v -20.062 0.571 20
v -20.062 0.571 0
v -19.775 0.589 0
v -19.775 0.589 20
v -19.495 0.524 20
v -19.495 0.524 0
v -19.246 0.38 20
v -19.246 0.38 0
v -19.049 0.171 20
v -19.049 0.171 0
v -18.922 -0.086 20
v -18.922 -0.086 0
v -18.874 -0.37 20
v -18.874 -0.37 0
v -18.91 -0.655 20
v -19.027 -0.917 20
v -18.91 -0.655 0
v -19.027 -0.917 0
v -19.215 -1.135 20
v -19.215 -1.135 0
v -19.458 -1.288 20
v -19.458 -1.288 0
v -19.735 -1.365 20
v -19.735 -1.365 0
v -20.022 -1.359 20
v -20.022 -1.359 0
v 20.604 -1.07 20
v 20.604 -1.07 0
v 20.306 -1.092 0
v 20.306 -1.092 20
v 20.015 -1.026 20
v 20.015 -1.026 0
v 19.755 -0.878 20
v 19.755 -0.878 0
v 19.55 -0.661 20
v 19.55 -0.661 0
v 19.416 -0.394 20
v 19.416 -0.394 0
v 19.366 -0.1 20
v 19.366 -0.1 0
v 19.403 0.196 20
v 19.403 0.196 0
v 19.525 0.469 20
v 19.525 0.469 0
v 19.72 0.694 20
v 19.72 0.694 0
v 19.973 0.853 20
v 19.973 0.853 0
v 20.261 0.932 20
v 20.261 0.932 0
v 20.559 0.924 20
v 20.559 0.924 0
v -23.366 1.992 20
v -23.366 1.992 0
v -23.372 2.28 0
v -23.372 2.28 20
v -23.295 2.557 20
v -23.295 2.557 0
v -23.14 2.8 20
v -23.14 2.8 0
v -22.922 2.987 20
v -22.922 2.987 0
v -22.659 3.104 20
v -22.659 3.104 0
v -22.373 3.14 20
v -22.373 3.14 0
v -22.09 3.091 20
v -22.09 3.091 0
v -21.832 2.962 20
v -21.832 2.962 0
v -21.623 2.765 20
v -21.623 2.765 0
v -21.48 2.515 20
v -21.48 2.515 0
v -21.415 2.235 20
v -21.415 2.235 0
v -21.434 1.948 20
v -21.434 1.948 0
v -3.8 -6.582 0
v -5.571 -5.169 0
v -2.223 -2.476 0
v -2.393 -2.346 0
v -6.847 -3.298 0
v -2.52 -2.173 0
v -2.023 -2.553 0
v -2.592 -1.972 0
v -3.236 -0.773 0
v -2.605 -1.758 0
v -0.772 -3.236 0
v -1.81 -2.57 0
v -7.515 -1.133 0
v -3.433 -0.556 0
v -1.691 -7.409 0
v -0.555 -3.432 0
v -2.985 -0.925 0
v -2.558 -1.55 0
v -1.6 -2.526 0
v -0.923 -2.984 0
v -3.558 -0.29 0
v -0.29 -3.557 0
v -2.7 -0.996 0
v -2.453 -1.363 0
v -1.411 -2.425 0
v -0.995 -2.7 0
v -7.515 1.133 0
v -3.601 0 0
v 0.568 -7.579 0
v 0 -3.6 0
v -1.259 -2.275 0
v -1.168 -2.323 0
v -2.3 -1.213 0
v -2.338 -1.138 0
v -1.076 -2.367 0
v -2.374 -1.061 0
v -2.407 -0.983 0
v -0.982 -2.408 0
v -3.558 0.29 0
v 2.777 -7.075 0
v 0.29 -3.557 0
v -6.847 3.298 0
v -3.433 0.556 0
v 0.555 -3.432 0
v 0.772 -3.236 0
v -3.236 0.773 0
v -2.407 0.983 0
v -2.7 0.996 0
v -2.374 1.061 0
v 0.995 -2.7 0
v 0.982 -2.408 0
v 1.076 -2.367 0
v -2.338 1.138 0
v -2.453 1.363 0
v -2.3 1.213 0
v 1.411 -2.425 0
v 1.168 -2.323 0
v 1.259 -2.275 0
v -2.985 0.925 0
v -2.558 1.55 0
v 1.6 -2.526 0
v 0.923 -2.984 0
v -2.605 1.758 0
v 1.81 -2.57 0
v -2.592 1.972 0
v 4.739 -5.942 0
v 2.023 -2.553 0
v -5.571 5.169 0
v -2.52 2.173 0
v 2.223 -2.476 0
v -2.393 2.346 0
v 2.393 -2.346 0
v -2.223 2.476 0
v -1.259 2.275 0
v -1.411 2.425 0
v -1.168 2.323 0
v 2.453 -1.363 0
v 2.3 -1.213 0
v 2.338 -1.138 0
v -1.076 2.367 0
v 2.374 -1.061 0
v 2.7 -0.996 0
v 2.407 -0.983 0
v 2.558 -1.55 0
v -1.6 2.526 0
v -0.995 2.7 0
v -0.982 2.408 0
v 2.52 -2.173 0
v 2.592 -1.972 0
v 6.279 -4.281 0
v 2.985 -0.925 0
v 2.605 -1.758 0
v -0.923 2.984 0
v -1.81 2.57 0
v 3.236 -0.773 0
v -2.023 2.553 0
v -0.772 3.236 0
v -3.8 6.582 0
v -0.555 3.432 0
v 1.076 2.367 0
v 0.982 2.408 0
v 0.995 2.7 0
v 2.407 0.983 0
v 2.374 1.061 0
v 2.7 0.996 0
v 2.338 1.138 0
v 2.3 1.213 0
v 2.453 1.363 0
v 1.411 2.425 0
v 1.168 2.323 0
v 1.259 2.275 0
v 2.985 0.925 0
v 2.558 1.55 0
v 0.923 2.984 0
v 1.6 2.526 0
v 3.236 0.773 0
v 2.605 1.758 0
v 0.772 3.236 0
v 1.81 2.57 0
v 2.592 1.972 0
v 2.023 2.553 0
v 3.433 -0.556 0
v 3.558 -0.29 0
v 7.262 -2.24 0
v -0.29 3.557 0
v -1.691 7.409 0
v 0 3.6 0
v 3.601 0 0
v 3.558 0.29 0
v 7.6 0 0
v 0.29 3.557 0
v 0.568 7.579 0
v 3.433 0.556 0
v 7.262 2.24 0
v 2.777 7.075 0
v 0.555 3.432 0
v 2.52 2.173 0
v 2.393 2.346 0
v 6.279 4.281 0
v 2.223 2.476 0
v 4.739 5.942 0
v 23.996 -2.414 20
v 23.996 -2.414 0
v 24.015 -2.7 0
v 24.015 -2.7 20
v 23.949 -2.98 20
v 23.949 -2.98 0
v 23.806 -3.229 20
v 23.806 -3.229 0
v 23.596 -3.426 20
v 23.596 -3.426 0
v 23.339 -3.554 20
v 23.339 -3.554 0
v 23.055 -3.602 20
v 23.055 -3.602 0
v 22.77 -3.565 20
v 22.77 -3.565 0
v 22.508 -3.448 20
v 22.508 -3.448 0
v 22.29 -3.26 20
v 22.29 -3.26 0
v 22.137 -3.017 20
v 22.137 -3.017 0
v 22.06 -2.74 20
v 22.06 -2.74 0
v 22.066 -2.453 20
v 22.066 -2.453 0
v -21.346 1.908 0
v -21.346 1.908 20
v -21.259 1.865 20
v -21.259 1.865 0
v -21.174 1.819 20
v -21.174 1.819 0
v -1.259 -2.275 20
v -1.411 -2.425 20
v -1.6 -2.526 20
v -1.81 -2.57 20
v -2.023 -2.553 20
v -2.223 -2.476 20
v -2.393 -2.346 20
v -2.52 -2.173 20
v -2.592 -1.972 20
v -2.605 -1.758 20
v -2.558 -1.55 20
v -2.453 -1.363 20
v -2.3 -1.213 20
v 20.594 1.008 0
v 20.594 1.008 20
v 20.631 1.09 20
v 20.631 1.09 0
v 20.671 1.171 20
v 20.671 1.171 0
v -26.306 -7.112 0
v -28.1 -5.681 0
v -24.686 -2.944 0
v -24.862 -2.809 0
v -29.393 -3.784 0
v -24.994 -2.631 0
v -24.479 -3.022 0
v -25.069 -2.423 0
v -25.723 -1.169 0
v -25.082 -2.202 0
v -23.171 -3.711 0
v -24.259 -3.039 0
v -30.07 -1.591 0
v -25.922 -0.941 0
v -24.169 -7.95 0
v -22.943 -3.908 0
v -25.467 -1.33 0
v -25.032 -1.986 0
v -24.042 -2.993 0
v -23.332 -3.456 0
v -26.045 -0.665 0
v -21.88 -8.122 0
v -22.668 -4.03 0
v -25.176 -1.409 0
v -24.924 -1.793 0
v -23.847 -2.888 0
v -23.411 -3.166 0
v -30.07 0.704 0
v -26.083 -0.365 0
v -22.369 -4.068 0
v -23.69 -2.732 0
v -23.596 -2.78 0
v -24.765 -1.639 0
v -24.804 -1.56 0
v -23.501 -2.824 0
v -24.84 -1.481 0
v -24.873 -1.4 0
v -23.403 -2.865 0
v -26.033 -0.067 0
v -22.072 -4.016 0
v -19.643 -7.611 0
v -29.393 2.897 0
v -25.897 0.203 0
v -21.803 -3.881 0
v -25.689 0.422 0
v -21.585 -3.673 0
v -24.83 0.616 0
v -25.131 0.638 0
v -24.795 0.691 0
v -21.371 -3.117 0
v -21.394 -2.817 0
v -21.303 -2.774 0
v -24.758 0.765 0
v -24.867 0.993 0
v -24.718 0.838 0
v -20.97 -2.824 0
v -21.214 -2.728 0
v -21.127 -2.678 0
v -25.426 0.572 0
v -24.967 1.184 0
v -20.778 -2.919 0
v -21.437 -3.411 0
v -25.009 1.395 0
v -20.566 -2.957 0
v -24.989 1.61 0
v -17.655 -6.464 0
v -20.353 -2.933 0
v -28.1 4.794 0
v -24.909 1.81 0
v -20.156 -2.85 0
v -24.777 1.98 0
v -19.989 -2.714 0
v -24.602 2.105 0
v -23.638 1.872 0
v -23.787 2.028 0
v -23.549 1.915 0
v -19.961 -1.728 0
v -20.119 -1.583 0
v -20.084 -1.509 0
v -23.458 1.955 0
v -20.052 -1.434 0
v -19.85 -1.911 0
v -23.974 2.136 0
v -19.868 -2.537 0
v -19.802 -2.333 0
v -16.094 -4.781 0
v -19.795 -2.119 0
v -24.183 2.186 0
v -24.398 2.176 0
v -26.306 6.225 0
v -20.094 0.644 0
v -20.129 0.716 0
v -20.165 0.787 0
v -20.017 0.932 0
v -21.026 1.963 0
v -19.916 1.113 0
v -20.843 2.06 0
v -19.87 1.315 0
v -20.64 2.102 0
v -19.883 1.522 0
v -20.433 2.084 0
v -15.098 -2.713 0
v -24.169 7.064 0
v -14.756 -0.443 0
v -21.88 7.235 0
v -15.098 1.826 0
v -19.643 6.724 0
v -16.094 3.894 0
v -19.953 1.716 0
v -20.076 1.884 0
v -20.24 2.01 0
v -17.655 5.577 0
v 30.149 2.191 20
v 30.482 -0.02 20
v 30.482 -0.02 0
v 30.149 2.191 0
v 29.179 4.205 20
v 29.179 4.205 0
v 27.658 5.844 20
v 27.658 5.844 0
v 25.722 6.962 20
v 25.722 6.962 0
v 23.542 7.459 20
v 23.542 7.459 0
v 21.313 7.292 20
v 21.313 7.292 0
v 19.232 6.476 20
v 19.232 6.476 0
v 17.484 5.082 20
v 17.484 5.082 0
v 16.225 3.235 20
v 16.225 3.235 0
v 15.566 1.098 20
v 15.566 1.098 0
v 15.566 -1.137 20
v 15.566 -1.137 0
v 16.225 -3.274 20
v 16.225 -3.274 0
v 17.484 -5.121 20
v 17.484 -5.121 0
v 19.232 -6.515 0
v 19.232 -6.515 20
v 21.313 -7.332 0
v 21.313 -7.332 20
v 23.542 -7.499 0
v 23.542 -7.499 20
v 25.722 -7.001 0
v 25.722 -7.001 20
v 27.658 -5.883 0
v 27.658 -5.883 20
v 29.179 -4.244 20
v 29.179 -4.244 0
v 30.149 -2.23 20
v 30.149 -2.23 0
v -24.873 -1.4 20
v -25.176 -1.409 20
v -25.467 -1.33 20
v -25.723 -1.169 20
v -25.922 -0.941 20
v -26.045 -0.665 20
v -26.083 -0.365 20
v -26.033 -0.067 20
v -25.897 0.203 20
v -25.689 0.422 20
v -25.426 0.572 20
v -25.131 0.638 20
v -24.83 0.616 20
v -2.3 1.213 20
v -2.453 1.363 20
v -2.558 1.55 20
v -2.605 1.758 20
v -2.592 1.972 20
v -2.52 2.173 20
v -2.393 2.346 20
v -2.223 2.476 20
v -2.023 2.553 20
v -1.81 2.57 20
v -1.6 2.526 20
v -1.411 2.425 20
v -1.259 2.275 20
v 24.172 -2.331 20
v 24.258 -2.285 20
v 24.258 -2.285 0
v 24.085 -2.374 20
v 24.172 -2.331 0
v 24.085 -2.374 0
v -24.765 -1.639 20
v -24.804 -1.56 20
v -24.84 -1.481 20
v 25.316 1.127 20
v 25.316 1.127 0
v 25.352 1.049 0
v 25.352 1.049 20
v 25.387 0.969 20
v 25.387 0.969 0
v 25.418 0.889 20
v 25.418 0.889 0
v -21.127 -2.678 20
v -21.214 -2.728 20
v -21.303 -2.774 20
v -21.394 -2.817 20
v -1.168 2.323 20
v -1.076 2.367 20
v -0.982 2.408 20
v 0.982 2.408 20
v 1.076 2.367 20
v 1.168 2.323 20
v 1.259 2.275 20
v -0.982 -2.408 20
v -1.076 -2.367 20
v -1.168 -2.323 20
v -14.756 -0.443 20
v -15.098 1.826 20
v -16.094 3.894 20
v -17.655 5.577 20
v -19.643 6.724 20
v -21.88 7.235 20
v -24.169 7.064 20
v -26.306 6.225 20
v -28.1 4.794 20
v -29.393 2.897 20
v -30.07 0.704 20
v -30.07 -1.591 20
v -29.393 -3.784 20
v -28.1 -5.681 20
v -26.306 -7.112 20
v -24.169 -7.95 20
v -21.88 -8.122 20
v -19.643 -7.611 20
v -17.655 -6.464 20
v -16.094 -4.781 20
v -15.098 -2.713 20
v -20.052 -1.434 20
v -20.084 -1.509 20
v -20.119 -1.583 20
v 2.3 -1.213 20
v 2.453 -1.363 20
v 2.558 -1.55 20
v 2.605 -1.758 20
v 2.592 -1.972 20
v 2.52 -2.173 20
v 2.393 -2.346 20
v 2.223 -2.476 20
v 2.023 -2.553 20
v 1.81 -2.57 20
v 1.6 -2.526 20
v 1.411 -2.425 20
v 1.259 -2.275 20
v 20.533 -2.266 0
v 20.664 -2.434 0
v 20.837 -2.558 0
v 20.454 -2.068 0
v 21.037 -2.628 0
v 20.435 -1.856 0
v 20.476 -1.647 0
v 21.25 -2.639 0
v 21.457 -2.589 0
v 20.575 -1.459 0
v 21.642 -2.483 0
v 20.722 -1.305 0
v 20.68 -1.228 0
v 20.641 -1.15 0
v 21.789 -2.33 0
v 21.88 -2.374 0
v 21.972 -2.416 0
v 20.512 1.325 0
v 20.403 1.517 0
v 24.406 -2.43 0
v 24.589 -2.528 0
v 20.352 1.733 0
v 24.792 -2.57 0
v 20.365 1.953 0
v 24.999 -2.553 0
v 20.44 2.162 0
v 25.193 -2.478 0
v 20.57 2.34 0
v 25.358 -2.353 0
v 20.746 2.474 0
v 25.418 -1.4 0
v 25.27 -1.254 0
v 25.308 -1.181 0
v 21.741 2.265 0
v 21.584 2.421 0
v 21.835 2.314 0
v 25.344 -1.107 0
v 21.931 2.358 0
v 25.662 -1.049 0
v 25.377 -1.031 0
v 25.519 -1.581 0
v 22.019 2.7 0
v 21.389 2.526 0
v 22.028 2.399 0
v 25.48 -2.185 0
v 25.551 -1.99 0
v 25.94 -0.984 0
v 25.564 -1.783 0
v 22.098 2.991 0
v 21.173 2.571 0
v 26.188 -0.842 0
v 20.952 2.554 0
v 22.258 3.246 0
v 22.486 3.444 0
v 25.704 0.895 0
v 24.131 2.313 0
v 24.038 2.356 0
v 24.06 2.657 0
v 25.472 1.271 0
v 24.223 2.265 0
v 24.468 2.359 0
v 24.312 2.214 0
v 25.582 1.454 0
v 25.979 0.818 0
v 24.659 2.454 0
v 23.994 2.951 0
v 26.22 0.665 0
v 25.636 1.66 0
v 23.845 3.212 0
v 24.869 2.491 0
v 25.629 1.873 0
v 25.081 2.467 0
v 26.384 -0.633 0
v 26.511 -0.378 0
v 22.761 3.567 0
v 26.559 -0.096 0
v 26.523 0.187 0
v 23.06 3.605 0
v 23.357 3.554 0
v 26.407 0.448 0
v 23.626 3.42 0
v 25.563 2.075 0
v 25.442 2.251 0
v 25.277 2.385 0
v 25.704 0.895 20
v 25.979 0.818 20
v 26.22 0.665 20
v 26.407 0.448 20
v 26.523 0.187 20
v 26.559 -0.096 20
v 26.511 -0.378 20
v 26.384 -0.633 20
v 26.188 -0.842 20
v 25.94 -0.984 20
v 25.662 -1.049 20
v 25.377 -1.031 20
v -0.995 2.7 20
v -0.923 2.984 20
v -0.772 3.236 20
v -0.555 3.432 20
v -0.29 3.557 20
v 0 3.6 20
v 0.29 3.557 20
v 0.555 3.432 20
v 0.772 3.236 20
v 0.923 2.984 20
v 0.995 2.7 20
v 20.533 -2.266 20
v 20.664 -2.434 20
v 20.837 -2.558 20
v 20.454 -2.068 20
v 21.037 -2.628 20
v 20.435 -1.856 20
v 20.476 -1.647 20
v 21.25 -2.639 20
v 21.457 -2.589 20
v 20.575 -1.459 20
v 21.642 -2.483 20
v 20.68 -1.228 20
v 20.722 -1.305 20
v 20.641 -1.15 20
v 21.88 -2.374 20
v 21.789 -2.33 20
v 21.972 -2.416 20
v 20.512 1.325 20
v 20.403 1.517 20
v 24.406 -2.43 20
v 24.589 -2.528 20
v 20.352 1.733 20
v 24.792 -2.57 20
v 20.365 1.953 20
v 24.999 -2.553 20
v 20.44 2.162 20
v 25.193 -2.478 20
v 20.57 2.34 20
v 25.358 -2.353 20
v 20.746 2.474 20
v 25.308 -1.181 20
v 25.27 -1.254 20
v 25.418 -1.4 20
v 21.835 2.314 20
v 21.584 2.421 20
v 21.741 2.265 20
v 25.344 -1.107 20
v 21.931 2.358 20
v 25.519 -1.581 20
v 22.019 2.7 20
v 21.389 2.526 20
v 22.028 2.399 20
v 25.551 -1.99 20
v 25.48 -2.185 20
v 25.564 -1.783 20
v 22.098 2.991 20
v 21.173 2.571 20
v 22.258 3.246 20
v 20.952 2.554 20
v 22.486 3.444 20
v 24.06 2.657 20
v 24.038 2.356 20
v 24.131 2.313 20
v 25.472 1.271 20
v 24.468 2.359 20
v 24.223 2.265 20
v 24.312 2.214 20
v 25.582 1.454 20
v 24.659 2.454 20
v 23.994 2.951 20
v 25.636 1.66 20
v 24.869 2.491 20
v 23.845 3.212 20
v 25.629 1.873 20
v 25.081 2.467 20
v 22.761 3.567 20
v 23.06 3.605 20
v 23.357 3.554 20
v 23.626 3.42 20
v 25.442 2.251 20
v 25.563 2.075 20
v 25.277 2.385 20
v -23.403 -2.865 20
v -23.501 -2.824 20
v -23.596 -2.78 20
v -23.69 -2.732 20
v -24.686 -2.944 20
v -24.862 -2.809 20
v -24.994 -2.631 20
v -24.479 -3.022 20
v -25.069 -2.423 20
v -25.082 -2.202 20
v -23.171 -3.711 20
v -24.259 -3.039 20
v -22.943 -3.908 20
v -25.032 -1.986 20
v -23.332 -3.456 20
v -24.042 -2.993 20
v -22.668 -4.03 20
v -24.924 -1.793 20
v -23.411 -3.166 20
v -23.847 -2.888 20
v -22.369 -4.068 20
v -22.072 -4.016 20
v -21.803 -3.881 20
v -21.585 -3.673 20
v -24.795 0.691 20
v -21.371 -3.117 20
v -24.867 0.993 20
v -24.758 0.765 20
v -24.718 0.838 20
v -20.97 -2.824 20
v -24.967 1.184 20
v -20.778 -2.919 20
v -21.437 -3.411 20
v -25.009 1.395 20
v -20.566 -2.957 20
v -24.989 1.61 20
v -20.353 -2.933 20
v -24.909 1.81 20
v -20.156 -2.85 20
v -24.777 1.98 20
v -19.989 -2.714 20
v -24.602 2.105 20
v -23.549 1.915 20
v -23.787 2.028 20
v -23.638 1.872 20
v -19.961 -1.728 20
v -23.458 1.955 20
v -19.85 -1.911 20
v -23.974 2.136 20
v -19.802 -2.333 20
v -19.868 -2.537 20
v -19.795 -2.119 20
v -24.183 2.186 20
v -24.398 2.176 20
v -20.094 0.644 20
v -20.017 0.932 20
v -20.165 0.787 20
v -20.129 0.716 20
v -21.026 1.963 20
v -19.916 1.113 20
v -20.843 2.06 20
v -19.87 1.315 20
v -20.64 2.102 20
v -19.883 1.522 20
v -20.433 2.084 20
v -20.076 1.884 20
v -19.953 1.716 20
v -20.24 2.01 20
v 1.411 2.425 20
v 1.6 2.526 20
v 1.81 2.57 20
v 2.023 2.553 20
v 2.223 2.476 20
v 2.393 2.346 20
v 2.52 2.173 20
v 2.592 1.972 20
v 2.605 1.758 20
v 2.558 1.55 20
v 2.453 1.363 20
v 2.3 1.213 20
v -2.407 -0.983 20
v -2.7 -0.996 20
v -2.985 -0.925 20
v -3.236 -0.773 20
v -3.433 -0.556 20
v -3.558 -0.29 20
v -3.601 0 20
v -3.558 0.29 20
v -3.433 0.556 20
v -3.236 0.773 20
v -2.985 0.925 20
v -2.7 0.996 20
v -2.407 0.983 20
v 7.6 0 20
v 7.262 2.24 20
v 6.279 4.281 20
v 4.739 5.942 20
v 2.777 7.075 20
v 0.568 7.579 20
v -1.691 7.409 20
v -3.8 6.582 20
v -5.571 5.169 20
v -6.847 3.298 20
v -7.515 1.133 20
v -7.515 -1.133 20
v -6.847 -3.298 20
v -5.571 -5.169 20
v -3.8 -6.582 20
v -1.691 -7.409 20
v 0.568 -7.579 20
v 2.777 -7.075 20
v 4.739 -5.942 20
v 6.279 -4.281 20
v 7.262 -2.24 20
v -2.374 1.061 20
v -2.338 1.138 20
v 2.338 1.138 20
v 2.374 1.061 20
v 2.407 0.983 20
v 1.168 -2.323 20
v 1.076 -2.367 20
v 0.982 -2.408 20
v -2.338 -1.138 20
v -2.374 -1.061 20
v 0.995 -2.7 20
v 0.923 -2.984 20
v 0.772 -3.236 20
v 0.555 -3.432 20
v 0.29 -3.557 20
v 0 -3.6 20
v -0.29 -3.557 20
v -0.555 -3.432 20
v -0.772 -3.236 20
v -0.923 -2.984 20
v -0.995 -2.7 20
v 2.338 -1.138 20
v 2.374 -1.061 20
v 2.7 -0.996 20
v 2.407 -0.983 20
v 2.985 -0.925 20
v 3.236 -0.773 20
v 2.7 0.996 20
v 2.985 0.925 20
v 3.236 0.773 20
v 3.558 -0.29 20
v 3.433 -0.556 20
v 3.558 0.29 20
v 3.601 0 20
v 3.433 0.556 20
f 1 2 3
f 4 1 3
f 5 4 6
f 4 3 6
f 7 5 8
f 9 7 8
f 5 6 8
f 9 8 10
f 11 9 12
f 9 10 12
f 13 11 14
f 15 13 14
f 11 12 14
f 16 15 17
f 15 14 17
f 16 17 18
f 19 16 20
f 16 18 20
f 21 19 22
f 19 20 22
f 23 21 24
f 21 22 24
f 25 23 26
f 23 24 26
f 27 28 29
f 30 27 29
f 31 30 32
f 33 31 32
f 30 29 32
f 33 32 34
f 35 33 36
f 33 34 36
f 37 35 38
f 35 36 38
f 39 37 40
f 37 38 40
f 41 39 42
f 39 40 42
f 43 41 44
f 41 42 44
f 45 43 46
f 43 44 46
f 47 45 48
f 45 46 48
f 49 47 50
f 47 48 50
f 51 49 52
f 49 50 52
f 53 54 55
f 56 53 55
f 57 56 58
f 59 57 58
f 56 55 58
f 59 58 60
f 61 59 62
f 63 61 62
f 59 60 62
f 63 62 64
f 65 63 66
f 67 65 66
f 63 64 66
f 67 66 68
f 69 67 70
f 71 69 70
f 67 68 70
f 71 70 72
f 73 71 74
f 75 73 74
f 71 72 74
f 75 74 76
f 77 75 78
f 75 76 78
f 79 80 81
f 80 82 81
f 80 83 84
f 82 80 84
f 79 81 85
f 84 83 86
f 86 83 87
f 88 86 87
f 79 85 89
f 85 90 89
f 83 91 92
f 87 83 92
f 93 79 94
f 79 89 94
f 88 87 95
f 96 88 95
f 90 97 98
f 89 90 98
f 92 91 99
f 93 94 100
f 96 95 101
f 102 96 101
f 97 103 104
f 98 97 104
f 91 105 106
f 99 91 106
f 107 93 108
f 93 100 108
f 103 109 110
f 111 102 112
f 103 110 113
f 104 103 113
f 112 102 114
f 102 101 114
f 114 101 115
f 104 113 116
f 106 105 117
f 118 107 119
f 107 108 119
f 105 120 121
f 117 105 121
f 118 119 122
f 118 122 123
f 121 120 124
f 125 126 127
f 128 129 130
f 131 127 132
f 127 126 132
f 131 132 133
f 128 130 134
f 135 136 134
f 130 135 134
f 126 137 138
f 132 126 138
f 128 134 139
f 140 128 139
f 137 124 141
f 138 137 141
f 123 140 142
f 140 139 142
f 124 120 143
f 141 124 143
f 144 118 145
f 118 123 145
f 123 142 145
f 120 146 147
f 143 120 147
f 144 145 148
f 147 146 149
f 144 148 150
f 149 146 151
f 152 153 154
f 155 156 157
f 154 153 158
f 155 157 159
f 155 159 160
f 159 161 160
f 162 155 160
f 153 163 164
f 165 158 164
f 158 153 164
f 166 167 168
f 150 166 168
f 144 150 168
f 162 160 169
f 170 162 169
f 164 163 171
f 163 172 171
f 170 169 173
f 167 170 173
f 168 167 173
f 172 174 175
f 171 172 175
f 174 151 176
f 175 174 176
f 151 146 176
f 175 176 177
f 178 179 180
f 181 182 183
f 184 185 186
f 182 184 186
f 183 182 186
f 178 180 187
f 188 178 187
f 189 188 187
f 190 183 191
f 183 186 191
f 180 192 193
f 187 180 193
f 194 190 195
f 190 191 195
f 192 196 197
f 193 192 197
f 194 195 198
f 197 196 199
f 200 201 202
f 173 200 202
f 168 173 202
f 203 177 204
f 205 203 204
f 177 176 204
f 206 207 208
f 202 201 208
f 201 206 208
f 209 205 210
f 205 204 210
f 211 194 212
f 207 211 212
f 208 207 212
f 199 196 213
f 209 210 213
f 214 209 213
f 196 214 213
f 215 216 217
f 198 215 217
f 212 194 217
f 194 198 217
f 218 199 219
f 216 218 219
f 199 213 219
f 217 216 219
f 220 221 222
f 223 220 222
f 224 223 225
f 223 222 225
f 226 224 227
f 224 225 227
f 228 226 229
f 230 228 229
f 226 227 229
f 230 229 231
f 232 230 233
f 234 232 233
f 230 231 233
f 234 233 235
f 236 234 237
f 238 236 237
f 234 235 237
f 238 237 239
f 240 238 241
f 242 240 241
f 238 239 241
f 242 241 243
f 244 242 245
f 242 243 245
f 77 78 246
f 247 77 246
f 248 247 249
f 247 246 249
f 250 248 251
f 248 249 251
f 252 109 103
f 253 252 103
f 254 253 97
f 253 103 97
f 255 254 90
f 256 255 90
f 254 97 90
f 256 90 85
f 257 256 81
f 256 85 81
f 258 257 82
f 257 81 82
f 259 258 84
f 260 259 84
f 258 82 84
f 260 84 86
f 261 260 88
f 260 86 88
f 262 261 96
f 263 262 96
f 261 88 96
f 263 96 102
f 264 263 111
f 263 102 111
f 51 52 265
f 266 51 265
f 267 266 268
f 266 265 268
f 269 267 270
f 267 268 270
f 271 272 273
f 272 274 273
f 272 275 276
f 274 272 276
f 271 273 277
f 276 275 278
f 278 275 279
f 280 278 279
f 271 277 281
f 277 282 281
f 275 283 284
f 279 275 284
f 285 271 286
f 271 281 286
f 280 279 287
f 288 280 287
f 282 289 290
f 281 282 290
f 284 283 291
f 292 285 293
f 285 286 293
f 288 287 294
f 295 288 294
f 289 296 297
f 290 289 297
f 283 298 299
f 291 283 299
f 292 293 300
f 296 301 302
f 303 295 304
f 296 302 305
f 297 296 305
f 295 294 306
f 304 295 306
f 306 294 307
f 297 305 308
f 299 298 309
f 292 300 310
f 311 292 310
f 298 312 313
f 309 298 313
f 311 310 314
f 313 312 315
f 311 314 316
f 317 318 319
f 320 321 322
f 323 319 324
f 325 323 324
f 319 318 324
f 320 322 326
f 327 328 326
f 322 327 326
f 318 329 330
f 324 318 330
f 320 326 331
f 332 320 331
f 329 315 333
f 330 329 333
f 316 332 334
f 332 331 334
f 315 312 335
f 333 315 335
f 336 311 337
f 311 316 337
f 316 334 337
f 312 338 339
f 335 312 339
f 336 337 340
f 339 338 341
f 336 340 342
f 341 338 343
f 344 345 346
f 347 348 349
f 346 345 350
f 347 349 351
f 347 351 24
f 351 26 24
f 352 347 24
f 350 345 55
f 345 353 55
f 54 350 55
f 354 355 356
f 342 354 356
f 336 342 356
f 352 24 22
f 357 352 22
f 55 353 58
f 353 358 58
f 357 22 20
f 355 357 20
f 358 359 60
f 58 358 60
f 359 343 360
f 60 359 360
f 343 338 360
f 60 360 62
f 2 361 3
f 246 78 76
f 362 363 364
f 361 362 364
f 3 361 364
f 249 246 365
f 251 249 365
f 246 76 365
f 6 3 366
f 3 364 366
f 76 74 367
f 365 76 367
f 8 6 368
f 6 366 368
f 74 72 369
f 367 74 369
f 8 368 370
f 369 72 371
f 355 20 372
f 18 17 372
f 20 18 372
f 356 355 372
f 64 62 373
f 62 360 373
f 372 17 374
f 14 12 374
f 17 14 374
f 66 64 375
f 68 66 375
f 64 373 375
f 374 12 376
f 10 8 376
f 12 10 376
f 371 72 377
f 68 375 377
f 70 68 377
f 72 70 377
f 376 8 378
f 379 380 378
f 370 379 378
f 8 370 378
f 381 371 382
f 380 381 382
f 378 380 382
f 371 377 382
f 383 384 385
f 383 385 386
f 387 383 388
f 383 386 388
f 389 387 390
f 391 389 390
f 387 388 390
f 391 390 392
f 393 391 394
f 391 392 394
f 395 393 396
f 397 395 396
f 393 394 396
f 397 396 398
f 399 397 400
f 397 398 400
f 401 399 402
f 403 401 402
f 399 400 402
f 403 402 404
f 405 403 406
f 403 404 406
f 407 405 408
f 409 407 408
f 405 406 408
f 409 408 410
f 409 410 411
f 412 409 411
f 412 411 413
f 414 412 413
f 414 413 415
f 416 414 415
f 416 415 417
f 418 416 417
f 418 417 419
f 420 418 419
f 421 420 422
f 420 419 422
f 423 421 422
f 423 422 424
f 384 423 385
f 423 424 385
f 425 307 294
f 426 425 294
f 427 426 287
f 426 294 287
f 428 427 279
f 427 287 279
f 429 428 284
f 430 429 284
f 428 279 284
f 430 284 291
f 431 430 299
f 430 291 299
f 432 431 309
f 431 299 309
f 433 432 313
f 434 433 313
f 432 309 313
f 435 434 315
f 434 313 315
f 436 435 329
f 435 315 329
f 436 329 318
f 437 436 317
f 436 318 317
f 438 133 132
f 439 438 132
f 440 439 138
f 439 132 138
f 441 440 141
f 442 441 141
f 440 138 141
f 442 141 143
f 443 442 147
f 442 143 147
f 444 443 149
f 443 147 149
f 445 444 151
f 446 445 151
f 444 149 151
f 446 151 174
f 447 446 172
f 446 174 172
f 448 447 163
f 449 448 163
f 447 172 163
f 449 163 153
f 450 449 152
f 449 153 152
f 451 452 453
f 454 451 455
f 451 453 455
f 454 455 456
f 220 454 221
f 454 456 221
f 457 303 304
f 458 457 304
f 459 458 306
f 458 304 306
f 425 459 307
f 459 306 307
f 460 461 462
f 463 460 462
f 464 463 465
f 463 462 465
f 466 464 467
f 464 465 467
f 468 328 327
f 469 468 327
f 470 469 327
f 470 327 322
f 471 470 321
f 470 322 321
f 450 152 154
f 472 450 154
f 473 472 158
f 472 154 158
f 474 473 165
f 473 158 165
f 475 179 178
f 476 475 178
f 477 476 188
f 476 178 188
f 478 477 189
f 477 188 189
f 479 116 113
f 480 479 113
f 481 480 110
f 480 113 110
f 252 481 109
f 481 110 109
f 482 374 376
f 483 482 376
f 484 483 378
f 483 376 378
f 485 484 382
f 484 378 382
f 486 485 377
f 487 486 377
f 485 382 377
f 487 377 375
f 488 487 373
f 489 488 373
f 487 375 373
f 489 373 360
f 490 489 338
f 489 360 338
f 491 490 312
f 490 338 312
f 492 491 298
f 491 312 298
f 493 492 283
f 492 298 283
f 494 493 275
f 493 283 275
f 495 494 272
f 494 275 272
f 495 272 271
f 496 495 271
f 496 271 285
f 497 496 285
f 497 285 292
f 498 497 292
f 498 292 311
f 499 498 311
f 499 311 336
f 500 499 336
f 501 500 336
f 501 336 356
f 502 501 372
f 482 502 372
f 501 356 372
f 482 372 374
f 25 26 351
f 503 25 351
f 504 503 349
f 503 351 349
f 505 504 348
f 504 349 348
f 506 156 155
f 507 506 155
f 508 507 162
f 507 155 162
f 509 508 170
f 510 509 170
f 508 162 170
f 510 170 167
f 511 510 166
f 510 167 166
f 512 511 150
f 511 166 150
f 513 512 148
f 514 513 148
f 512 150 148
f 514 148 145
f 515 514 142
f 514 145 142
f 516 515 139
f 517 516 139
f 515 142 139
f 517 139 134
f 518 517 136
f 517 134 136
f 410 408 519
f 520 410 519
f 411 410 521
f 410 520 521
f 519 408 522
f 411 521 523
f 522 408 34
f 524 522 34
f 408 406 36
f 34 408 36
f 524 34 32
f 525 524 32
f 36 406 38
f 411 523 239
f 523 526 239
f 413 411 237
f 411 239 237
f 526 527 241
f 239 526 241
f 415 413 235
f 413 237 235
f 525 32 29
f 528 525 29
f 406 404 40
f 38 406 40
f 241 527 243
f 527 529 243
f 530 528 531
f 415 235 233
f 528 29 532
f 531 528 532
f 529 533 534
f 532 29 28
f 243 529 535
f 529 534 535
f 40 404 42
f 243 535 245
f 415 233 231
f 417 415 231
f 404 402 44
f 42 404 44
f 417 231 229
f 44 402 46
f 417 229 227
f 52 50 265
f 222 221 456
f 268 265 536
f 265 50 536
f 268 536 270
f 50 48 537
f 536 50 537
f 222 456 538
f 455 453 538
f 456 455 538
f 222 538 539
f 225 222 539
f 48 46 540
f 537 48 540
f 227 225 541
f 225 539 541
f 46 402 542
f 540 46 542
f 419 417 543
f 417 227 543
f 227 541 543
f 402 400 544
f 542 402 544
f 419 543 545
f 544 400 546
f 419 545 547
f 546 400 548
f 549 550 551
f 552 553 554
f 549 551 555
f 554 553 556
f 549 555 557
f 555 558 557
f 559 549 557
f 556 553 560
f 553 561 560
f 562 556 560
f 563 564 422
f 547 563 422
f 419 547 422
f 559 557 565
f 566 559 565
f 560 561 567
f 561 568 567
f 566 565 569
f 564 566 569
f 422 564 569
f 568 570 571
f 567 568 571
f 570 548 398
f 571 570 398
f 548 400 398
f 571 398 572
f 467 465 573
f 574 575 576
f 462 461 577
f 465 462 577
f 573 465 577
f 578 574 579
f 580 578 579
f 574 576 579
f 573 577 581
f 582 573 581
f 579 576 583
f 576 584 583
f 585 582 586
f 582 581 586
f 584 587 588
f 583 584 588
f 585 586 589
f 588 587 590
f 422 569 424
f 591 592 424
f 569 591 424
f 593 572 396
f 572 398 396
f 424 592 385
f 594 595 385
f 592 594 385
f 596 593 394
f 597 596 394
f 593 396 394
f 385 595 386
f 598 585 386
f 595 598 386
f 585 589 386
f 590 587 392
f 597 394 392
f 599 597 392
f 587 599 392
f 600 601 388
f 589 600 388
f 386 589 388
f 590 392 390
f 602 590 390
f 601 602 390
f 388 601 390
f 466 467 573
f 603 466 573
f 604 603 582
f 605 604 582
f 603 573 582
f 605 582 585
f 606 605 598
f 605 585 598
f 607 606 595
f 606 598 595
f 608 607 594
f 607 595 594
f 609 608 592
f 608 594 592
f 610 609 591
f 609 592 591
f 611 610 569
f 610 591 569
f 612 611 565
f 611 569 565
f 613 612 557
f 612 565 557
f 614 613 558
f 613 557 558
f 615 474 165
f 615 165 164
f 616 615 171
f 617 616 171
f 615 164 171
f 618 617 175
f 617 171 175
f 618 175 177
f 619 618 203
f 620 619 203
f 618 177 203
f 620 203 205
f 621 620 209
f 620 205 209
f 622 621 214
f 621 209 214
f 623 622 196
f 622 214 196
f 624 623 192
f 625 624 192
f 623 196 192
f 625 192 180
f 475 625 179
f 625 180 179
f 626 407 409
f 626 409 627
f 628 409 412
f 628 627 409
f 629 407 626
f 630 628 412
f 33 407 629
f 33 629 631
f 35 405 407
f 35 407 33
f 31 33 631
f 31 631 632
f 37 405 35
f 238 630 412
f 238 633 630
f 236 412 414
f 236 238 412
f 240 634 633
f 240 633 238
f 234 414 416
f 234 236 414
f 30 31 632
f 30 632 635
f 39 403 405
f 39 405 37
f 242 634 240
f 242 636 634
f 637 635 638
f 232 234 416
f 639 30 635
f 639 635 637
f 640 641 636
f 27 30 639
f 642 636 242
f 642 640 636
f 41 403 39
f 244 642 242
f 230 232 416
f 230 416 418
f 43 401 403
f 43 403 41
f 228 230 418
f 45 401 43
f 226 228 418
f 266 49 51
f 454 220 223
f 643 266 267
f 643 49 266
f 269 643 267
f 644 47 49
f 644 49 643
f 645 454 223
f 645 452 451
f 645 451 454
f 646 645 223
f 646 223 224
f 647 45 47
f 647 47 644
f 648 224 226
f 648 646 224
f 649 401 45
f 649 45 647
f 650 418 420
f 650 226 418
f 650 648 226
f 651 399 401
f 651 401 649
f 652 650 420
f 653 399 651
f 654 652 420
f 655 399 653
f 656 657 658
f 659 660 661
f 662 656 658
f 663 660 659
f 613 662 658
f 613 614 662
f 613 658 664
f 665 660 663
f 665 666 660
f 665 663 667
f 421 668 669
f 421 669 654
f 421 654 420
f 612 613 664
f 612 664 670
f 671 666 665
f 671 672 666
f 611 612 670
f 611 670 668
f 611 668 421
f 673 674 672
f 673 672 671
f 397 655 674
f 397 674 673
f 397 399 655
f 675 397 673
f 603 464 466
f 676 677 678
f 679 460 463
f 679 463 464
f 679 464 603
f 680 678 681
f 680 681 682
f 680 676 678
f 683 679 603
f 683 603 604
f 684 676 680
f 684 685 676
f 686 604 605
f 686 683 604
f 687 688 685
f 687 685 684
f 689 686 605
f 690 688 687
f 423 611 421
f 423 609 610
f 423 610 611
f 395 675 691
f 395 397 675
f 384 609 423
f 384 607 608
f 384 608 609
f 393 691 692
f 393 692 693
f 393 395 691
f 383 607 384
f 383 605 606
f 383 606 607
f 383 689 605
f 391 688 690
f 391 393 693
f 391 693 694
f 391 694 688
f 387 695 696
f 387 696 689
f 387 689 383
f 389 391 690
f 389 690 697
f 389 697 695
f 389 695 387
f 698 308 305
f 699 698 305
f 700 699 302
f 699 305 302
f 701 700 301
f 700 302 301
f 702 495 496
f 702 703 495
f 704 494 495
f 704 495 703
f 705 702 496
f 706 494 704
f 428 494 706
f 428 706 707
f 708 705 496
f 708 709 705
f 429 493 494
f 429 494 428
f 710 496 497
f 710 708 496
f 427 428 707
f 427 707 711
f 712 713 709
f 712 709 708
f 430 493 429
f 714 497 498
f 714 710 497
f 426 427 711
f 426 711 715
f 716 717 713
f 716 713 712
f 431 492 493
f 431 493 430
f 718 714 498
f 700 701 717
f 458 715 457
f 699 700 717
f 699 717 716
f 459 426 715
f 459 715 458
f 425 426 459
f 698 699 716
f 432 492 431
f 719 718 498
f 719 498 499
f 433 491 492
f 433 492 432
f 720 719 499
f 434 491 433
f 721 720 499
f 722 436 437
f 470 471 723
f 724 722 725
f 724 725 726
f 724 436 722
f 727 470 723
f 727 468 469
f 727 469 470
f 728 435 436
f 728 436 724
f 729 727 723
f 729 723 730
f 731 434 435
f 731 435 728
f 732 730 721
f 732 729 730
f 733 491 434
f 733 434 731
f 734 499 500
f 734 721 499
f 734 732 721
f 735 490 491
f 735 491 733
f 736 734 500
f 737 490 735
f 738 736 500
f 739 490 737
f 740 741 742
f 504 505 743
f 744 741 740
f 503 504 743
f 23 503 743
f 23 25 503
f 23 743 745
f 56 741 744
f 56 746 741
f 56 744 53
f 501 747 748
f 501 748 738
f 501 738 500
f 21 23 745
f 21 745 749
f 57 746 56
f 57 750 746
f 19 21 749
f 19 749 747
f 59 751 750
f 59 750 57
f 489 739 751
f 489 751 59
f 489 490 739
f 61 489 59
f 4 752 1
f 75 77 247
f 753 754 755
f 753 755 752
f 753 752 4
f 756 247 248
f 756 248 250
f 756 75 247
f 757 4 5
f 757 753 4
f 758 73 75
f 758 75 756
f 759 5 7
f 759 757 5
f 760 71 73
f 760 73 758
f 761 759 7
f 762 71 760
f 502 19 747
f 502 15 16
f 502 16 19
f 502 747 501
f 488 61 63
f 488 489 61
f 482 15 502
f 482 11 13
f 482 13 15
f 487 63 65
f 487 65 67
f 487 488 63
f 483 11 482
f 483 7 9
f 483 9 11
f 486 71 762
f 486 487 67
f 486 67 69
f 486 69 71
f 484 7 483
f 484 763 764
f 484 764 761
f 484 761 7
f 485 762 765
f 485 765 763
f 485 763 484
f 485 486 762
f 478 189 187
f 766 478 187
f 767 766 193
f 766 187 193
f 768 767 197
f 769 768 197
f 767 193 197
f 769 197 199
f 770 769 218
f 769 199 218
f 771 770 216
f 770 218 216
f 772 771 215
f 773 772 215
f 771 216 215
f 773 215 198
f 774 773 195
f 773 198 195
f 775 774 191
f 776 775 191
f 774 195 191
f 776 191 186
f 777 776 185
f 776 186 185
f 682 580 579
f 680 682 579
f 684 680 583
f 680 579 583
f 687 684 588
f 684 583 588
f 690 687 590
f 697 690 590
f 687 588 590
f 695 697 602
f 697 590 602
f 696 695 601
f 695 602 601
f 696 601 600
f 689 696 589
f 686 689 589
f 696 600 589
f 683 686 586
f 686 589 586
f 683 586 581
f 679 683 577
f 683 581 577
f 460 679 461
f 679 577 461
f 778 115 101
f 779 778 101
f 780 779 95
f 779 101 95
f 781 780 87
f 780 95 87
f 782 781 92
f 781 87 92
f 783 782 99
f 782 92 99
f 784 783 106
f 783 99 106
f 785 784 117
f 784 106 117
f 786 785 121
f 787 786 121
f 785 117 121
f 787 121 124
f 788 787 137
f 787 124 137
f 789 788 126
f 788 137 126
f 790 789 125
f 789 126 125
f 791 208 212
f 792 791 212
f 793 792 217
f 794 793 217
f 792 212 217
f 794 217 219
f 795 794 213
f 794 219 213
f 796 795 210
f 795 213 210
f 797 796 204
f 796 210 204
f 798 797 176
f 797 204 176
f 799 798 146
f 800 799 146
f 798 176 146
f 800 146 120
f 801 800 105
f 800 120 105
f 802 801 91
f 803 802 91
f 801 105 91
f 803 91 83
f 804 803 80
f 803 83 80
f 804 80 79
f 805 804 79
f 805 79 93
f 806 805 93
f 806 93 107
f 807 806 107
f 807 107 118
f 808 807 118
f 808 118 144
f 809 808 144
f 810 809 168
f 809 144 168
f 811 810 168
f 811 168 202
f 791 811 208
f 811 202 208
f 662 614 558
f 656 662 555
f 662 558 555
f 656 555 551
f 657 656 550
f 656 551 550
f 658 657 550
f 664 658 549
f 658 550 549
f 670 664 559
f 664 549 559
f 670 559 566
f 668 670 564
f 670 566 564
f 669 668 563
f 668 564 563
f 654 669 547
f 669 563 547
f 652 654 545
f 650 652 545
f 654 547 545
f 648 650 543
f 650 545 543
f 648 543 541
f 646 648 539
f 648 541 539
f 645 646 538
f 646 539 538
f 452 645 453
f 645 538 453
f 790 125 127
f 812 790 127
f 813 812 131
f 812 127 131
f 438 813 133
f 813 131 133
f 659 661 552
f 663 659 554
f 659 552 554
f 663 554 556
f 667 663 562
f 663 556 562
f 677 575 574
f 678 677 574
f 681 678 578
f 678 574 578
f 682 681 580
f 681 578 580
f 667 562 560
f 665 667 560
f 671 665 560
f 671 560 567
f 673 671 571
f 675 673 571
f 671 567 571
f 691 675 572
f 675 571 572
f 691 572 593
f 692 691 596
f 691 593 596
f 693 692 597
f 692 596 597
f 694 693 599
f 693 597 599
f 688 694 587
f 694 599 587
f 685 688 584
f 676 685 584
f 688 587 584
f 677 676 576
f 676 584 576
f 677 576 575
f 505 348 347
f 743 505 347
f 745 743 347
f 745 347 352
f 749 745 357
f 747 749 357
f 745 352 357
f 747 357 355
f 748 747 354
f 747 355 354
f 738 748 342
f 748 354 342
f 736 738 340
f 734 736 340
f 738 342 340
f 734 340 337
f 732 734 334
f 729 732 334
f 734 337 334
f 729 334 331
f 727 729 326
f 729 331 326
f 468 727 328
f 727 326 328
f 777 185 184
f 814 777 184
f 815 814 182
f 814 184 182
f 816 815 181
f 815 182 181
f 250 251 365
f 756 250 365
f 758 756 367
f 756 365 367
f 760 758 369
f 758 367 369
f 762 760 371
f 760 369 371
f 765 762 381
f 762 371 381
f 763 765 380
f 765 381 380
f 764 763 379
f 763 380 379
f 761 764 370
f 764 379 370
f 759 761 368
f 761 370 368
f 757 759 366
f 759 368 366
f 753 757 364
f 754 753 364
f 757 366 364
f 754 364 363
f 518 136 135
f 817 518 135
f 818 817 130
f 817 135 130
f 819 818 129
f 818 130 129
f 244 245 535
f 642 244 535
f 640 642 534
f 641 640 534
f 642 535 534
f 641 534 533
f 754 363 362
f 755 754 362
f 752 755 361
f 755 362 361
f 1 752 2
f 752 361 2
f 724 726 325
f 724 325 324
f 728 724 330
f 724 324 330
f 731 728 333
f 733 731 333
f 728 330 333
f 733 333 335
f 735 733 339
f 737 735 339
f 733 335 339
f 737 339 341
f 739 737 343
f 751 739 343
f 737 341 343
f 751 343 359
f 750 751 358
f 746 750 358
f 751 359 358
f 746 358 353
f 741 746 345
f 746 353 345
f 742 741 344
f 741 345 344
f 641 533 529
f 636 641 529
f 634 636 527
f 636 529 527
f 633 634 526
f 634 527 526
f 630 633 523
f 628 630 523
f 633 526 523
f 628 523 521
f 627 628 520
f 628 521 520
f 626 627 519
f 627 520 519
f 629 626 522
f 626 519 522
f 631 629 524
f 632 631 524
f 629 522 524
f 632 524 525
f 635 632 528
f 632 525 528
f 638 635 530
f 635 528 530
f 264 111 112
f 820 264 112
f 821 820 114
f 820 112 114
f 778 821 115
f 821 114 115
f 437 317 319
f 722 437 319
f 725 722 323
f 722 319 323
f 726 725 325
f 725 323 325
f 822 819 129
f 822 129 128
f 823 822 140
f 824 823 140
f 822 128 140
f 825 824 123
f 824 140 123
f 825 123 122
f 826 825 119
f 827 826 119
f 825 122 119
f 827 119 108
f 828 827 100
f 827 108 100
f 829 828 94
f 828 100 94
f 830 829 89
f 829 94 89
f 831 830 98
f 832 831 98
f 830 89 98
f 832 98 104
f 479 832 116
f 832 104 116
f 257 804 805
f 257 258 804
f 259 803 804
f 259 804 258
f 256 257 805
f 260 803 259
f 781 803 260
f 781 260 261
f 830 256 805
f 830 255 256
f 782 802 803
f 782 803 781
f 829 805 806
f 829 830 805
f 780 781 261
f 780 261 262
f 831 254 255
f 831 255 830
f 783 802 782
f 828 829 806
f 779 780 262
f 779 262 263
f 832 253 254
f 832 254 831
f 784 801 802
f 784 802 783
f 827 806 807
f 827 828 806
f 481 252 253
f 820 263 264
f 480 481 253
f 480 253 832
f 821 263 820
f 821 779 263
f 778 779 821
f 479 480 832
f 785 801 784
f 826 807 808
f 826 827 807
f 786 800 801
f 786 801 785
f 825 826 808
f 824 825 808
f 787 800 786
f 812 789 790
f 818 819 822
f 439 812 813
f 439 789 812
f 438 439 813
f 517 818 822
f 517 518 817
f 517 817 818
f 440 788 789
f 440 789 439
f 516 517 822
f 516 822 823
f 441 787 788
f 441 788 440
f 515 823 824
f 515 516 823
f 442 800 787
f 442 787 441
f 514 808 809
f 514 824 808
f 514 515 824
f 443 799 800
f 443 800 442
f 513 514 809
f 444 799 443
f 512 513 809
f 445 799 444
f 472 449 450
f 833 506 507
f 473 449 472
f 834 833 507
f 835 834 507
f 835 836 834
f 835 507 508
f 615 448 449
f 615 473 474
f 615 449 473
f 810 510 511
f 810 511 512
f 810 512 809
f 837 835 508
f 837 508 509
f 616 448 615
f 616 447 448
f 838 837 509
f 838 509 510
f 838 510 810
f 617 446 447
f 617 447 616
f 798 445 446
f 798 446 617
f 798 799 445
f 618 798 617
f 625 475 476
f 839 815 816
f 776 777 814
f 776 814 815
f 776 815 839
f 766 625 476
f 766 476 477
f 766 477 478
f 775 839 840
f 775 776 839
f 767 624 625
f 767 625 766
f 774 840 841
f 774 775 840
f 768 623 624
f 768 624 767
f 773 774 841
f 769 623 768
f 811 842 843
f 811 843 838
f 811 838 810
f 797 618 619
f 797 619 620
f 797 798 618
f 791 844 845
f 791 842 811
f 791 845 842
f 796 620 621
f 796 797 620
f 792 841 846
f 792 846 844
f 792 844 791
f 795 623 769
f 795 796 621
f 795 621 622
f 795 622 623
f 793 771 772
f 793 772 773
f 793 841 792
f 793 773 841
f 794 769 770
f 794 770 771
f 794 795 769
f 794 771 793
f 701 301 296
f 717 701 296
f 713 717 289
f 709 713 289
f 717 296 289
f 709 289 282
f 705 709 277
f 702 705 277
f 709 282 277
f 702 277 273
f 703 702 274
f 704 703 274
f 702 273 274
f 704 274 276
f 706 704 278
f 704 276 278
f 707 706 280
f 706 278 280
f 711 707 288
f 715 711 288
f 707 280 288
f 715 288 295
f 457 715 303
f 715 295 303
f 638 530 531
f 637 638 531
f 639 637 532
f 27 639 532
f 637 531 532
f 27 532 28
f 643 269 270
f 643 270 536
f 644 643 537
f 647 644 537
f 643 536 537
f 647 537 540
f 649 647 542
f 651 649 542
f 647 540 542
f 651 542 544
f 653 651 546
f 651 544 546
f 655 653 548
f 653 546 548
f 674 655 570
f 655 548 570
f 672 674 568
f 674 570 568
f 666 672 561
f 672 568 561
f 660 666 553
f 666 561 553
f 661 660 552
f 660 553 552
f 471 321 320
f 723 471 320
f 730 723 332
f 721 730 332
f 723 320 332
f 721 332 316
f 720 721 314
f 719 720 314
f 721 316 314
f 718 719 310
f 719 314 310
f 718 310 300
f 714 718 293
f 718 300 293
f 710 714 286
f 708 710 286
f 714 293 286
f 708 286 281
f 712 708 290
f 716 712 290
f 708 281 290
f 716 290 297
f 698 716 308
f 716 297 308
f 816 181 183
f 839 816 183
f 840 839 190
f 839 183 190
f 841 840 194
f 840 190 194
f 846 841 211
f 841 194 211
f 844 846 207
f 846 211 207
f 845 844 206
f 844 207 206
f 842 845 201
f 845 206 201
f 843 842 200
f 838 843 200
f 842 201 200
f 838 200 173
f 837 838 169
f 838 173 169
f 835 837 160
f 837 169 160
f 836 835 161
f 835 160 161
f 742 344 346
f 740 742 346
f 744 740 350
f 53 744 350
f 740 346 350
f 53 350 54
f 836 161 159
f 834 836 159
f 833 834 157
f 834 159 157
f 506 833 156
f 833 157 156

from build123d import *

# Parameters (mm, degrees)
F0_R     = 7.6
F0_R_2   = 7.5
F0_R_3   = 7.7
F1_DEPTH = 20


with BuildPart() as f1:
    # F0 (on Top) → F1 (new body)
    with BuildSketch(Plane.XY):
        Circle(F0_R)
        with BuildLine():
            ThreePointArc((2.299572, 1.213247), (2.356167, 1.099308), (2.40712, 0.982738))
            ThreePointArc((2.40712, 0.982738), (3.601487, 0), (2.40712, -0.982738))
            ThreePointArc((2.40712, -0.982738), (2.356167, -1.099308), (2.299572, -1.213247))
            ThreePointArc((2.299572, -1.213247), (2.393171, -2.346023), (1.258756, -2.27498))
            ThreePointArc((1.258756, -2.27498), (1.122092, -2.345402), (0.981503, -2.407624))
            ThreePointArc((0.981503, -2.407624), (0, -3.600179), (-0.981503, -2.407624))
            ThreePointArc((-0.981503, -2.407624), (-1.122092, -2.345402), (-1.258756, -2.27498))
            ThreePointArc((-1.258756, -2.27498), (-2.393171, -2.346023), (-2.299572, -1.213247))
            ThreePointArc((-2.299572, -1.213247), (-2.356167, -1.099308), (-2.40712, -0.982738))
            ThreePointArc((-2.40712, -0.982738), (-3.601487, 0), (-2.40712, 0.982738))
            ThreePointArc((-2.40712, 0.982738), (-2.356167, 1.099308), (-2.299572, 1.213247))
            ThreePointArc((-2.299572, 1.213247), (-2.393171, 2.346023), (-1.258756, 2.27498))
            ThreePointArc((-1.258756, 2.27498), (-1.122092, 2.345402), (-0.981503, 2.407624))
            ThreePointArc((-0.981503, 2.407624), (0, 3.600179), (0.981503, 2.407624))
            ThreePointArc((0.981503, 2.407624), (1.122092, 2.345402), (1.258756, 2.27498))
            ThreePointArc((1.258756, 2.27498), (2.393171, 2.346023), (2.299572, 1.213247))
        make_face(mode=Mode.SUBTRACT)
        with Locations((22.981999, -0.019552)):
            Circle(F0_R_2)
        with BuildLine():
            ThreePointArc((25.315564, 1.126953), (25.369864, 1.009088), (25.418215, 0.888661))
            ThreePointArc((25.418215, 0.888661), (26.558661, -0.095983), (25.377193, -1.031009))
            ThreePointArc((25.377193, -1.031009), (25.326325, -1.143888), (25.270142, -1.254218))
            ThreePointArc((25.270142, -1.254218), (25.35756, -2.352548), (24.25783, -2.285))
            ThreePointArc((24.25783, -2.285), (24.128881, -2.352931), (23.996329, -2.41353))
            ThreePointArc((23.996329, -2.41353), (23.055329, -3.601637), (22.066493, -2.453037))
            ThreePointArc((22.066493, -2.453037), (21.925849, -2.395377), (21.788815, -2.329598))
            ThreePointArc((21.788815, -2.329598), (20.663621, -2.433802), (20.722171, -1.305312))
            ThreePointArc((20.722171, -1.305312), (20.659994, -1.189293), (20.603769, -1.070277))
            ThreePointArc((20.603769, -1.070277), (19.365764, -0.100131), (20.559327, 0.924197))
            ThreePointArc((20.559327, 0.924197), (20.611761, 1.049081), (20.670628, 1.171065))
            ThreePointArc((20.670628, 1.171065), (20.570294, 2.34008), (21.741221, 2.265283))
            ThreePointArc((21.741221, 2.265283), (21.882641, 2.336592), (22.028141, 2.399158))
            ThreePointArc((22.028141, 2.399158), (23.05951, 3.60511), (24.038383, 2.35617))
            ThreePointArc((24.038383, 2.35617), (24.177338, 2.28938), (24.31209, 2.214471))
            ThreePointArc((24.31209, 2.214471), (25.442296, 2.250613), (25.315564, 1.126953))
        make_face(mode=Mode.SUBTRACT)
        with Locations((-22.455713, -0.443438)):
            Circle(F0_R_3)
        with BuildLine():
            ThreePointArc((-20.165257, 0.786934), (-20.111019, 0.680133), (-20.061757, 0.570948))
            ThreePointArc((-20.061757, 0.570948), (-18.873838, -0.369745), (-20.022061, -1.358502))
            ThreePointArc((-20.022061, -1.358502), (-20.067743, -1.471835), (-20.118699, -1.582896))
            ThreePointArc((-20.118699, -1.582896), (-19.989275, -2.714063), (-21.127264, -2.678438))
            ThreePointArc((-21.127264, -2.678438), (-21.258448, -2.751371), (-21.393622, -2.816613))
            ThreePointArc((-21.393622, -2.816613), (-22.368977, -4.067523), (-23.403058, -2.864705))
            ThreePointArc((-23.403058, -2.864705), (-23.548672, -2.802556), (-23.690233, -2.73166))
            ThreePointArc((-23.690233, -2.73166), (-24.862471, -2.809442), (-24.764682, -1.638704))
            ThreePointArc((-24.764682, -1.638704), (-24.82209, -1.52059), (-24.873461, -1.399728))
            ThreePointArc((-24.873461, -1.399728), (-26.083373, -0.365222), (-24.829997, 0.616173))
            ThreePointArc((-24.829997, 0.616173), (-24.77666, 0.7284), (-24.718022, 0.837951))
            ThreePointArc((-24.718022, 0.837951), (-24.776712, 1.979775), (-23.638475, 1.871961))
            ThreePointArc((-23.638475, 1.871961), (-23.504057, 1.935842), (-23.366205, 1.991928))
            ThreePointArc((-23.366205, 1.991928), (-22.373498, 3.139511), (-21.434474, 1.947602))
            ThreePointArc((-21.434474, 1.947602), (-21.302446, 1.886793), (-21.174023, 1.818701))
            ThreePointArc((-21.174023, 1.818701), (-20.075605, 1.88361), (-20.165257, 0.786934))
        make_face(mode=Mode.SUBTRACT)
    extrude(amount=F1_DEPTH)


solid = f1.part
